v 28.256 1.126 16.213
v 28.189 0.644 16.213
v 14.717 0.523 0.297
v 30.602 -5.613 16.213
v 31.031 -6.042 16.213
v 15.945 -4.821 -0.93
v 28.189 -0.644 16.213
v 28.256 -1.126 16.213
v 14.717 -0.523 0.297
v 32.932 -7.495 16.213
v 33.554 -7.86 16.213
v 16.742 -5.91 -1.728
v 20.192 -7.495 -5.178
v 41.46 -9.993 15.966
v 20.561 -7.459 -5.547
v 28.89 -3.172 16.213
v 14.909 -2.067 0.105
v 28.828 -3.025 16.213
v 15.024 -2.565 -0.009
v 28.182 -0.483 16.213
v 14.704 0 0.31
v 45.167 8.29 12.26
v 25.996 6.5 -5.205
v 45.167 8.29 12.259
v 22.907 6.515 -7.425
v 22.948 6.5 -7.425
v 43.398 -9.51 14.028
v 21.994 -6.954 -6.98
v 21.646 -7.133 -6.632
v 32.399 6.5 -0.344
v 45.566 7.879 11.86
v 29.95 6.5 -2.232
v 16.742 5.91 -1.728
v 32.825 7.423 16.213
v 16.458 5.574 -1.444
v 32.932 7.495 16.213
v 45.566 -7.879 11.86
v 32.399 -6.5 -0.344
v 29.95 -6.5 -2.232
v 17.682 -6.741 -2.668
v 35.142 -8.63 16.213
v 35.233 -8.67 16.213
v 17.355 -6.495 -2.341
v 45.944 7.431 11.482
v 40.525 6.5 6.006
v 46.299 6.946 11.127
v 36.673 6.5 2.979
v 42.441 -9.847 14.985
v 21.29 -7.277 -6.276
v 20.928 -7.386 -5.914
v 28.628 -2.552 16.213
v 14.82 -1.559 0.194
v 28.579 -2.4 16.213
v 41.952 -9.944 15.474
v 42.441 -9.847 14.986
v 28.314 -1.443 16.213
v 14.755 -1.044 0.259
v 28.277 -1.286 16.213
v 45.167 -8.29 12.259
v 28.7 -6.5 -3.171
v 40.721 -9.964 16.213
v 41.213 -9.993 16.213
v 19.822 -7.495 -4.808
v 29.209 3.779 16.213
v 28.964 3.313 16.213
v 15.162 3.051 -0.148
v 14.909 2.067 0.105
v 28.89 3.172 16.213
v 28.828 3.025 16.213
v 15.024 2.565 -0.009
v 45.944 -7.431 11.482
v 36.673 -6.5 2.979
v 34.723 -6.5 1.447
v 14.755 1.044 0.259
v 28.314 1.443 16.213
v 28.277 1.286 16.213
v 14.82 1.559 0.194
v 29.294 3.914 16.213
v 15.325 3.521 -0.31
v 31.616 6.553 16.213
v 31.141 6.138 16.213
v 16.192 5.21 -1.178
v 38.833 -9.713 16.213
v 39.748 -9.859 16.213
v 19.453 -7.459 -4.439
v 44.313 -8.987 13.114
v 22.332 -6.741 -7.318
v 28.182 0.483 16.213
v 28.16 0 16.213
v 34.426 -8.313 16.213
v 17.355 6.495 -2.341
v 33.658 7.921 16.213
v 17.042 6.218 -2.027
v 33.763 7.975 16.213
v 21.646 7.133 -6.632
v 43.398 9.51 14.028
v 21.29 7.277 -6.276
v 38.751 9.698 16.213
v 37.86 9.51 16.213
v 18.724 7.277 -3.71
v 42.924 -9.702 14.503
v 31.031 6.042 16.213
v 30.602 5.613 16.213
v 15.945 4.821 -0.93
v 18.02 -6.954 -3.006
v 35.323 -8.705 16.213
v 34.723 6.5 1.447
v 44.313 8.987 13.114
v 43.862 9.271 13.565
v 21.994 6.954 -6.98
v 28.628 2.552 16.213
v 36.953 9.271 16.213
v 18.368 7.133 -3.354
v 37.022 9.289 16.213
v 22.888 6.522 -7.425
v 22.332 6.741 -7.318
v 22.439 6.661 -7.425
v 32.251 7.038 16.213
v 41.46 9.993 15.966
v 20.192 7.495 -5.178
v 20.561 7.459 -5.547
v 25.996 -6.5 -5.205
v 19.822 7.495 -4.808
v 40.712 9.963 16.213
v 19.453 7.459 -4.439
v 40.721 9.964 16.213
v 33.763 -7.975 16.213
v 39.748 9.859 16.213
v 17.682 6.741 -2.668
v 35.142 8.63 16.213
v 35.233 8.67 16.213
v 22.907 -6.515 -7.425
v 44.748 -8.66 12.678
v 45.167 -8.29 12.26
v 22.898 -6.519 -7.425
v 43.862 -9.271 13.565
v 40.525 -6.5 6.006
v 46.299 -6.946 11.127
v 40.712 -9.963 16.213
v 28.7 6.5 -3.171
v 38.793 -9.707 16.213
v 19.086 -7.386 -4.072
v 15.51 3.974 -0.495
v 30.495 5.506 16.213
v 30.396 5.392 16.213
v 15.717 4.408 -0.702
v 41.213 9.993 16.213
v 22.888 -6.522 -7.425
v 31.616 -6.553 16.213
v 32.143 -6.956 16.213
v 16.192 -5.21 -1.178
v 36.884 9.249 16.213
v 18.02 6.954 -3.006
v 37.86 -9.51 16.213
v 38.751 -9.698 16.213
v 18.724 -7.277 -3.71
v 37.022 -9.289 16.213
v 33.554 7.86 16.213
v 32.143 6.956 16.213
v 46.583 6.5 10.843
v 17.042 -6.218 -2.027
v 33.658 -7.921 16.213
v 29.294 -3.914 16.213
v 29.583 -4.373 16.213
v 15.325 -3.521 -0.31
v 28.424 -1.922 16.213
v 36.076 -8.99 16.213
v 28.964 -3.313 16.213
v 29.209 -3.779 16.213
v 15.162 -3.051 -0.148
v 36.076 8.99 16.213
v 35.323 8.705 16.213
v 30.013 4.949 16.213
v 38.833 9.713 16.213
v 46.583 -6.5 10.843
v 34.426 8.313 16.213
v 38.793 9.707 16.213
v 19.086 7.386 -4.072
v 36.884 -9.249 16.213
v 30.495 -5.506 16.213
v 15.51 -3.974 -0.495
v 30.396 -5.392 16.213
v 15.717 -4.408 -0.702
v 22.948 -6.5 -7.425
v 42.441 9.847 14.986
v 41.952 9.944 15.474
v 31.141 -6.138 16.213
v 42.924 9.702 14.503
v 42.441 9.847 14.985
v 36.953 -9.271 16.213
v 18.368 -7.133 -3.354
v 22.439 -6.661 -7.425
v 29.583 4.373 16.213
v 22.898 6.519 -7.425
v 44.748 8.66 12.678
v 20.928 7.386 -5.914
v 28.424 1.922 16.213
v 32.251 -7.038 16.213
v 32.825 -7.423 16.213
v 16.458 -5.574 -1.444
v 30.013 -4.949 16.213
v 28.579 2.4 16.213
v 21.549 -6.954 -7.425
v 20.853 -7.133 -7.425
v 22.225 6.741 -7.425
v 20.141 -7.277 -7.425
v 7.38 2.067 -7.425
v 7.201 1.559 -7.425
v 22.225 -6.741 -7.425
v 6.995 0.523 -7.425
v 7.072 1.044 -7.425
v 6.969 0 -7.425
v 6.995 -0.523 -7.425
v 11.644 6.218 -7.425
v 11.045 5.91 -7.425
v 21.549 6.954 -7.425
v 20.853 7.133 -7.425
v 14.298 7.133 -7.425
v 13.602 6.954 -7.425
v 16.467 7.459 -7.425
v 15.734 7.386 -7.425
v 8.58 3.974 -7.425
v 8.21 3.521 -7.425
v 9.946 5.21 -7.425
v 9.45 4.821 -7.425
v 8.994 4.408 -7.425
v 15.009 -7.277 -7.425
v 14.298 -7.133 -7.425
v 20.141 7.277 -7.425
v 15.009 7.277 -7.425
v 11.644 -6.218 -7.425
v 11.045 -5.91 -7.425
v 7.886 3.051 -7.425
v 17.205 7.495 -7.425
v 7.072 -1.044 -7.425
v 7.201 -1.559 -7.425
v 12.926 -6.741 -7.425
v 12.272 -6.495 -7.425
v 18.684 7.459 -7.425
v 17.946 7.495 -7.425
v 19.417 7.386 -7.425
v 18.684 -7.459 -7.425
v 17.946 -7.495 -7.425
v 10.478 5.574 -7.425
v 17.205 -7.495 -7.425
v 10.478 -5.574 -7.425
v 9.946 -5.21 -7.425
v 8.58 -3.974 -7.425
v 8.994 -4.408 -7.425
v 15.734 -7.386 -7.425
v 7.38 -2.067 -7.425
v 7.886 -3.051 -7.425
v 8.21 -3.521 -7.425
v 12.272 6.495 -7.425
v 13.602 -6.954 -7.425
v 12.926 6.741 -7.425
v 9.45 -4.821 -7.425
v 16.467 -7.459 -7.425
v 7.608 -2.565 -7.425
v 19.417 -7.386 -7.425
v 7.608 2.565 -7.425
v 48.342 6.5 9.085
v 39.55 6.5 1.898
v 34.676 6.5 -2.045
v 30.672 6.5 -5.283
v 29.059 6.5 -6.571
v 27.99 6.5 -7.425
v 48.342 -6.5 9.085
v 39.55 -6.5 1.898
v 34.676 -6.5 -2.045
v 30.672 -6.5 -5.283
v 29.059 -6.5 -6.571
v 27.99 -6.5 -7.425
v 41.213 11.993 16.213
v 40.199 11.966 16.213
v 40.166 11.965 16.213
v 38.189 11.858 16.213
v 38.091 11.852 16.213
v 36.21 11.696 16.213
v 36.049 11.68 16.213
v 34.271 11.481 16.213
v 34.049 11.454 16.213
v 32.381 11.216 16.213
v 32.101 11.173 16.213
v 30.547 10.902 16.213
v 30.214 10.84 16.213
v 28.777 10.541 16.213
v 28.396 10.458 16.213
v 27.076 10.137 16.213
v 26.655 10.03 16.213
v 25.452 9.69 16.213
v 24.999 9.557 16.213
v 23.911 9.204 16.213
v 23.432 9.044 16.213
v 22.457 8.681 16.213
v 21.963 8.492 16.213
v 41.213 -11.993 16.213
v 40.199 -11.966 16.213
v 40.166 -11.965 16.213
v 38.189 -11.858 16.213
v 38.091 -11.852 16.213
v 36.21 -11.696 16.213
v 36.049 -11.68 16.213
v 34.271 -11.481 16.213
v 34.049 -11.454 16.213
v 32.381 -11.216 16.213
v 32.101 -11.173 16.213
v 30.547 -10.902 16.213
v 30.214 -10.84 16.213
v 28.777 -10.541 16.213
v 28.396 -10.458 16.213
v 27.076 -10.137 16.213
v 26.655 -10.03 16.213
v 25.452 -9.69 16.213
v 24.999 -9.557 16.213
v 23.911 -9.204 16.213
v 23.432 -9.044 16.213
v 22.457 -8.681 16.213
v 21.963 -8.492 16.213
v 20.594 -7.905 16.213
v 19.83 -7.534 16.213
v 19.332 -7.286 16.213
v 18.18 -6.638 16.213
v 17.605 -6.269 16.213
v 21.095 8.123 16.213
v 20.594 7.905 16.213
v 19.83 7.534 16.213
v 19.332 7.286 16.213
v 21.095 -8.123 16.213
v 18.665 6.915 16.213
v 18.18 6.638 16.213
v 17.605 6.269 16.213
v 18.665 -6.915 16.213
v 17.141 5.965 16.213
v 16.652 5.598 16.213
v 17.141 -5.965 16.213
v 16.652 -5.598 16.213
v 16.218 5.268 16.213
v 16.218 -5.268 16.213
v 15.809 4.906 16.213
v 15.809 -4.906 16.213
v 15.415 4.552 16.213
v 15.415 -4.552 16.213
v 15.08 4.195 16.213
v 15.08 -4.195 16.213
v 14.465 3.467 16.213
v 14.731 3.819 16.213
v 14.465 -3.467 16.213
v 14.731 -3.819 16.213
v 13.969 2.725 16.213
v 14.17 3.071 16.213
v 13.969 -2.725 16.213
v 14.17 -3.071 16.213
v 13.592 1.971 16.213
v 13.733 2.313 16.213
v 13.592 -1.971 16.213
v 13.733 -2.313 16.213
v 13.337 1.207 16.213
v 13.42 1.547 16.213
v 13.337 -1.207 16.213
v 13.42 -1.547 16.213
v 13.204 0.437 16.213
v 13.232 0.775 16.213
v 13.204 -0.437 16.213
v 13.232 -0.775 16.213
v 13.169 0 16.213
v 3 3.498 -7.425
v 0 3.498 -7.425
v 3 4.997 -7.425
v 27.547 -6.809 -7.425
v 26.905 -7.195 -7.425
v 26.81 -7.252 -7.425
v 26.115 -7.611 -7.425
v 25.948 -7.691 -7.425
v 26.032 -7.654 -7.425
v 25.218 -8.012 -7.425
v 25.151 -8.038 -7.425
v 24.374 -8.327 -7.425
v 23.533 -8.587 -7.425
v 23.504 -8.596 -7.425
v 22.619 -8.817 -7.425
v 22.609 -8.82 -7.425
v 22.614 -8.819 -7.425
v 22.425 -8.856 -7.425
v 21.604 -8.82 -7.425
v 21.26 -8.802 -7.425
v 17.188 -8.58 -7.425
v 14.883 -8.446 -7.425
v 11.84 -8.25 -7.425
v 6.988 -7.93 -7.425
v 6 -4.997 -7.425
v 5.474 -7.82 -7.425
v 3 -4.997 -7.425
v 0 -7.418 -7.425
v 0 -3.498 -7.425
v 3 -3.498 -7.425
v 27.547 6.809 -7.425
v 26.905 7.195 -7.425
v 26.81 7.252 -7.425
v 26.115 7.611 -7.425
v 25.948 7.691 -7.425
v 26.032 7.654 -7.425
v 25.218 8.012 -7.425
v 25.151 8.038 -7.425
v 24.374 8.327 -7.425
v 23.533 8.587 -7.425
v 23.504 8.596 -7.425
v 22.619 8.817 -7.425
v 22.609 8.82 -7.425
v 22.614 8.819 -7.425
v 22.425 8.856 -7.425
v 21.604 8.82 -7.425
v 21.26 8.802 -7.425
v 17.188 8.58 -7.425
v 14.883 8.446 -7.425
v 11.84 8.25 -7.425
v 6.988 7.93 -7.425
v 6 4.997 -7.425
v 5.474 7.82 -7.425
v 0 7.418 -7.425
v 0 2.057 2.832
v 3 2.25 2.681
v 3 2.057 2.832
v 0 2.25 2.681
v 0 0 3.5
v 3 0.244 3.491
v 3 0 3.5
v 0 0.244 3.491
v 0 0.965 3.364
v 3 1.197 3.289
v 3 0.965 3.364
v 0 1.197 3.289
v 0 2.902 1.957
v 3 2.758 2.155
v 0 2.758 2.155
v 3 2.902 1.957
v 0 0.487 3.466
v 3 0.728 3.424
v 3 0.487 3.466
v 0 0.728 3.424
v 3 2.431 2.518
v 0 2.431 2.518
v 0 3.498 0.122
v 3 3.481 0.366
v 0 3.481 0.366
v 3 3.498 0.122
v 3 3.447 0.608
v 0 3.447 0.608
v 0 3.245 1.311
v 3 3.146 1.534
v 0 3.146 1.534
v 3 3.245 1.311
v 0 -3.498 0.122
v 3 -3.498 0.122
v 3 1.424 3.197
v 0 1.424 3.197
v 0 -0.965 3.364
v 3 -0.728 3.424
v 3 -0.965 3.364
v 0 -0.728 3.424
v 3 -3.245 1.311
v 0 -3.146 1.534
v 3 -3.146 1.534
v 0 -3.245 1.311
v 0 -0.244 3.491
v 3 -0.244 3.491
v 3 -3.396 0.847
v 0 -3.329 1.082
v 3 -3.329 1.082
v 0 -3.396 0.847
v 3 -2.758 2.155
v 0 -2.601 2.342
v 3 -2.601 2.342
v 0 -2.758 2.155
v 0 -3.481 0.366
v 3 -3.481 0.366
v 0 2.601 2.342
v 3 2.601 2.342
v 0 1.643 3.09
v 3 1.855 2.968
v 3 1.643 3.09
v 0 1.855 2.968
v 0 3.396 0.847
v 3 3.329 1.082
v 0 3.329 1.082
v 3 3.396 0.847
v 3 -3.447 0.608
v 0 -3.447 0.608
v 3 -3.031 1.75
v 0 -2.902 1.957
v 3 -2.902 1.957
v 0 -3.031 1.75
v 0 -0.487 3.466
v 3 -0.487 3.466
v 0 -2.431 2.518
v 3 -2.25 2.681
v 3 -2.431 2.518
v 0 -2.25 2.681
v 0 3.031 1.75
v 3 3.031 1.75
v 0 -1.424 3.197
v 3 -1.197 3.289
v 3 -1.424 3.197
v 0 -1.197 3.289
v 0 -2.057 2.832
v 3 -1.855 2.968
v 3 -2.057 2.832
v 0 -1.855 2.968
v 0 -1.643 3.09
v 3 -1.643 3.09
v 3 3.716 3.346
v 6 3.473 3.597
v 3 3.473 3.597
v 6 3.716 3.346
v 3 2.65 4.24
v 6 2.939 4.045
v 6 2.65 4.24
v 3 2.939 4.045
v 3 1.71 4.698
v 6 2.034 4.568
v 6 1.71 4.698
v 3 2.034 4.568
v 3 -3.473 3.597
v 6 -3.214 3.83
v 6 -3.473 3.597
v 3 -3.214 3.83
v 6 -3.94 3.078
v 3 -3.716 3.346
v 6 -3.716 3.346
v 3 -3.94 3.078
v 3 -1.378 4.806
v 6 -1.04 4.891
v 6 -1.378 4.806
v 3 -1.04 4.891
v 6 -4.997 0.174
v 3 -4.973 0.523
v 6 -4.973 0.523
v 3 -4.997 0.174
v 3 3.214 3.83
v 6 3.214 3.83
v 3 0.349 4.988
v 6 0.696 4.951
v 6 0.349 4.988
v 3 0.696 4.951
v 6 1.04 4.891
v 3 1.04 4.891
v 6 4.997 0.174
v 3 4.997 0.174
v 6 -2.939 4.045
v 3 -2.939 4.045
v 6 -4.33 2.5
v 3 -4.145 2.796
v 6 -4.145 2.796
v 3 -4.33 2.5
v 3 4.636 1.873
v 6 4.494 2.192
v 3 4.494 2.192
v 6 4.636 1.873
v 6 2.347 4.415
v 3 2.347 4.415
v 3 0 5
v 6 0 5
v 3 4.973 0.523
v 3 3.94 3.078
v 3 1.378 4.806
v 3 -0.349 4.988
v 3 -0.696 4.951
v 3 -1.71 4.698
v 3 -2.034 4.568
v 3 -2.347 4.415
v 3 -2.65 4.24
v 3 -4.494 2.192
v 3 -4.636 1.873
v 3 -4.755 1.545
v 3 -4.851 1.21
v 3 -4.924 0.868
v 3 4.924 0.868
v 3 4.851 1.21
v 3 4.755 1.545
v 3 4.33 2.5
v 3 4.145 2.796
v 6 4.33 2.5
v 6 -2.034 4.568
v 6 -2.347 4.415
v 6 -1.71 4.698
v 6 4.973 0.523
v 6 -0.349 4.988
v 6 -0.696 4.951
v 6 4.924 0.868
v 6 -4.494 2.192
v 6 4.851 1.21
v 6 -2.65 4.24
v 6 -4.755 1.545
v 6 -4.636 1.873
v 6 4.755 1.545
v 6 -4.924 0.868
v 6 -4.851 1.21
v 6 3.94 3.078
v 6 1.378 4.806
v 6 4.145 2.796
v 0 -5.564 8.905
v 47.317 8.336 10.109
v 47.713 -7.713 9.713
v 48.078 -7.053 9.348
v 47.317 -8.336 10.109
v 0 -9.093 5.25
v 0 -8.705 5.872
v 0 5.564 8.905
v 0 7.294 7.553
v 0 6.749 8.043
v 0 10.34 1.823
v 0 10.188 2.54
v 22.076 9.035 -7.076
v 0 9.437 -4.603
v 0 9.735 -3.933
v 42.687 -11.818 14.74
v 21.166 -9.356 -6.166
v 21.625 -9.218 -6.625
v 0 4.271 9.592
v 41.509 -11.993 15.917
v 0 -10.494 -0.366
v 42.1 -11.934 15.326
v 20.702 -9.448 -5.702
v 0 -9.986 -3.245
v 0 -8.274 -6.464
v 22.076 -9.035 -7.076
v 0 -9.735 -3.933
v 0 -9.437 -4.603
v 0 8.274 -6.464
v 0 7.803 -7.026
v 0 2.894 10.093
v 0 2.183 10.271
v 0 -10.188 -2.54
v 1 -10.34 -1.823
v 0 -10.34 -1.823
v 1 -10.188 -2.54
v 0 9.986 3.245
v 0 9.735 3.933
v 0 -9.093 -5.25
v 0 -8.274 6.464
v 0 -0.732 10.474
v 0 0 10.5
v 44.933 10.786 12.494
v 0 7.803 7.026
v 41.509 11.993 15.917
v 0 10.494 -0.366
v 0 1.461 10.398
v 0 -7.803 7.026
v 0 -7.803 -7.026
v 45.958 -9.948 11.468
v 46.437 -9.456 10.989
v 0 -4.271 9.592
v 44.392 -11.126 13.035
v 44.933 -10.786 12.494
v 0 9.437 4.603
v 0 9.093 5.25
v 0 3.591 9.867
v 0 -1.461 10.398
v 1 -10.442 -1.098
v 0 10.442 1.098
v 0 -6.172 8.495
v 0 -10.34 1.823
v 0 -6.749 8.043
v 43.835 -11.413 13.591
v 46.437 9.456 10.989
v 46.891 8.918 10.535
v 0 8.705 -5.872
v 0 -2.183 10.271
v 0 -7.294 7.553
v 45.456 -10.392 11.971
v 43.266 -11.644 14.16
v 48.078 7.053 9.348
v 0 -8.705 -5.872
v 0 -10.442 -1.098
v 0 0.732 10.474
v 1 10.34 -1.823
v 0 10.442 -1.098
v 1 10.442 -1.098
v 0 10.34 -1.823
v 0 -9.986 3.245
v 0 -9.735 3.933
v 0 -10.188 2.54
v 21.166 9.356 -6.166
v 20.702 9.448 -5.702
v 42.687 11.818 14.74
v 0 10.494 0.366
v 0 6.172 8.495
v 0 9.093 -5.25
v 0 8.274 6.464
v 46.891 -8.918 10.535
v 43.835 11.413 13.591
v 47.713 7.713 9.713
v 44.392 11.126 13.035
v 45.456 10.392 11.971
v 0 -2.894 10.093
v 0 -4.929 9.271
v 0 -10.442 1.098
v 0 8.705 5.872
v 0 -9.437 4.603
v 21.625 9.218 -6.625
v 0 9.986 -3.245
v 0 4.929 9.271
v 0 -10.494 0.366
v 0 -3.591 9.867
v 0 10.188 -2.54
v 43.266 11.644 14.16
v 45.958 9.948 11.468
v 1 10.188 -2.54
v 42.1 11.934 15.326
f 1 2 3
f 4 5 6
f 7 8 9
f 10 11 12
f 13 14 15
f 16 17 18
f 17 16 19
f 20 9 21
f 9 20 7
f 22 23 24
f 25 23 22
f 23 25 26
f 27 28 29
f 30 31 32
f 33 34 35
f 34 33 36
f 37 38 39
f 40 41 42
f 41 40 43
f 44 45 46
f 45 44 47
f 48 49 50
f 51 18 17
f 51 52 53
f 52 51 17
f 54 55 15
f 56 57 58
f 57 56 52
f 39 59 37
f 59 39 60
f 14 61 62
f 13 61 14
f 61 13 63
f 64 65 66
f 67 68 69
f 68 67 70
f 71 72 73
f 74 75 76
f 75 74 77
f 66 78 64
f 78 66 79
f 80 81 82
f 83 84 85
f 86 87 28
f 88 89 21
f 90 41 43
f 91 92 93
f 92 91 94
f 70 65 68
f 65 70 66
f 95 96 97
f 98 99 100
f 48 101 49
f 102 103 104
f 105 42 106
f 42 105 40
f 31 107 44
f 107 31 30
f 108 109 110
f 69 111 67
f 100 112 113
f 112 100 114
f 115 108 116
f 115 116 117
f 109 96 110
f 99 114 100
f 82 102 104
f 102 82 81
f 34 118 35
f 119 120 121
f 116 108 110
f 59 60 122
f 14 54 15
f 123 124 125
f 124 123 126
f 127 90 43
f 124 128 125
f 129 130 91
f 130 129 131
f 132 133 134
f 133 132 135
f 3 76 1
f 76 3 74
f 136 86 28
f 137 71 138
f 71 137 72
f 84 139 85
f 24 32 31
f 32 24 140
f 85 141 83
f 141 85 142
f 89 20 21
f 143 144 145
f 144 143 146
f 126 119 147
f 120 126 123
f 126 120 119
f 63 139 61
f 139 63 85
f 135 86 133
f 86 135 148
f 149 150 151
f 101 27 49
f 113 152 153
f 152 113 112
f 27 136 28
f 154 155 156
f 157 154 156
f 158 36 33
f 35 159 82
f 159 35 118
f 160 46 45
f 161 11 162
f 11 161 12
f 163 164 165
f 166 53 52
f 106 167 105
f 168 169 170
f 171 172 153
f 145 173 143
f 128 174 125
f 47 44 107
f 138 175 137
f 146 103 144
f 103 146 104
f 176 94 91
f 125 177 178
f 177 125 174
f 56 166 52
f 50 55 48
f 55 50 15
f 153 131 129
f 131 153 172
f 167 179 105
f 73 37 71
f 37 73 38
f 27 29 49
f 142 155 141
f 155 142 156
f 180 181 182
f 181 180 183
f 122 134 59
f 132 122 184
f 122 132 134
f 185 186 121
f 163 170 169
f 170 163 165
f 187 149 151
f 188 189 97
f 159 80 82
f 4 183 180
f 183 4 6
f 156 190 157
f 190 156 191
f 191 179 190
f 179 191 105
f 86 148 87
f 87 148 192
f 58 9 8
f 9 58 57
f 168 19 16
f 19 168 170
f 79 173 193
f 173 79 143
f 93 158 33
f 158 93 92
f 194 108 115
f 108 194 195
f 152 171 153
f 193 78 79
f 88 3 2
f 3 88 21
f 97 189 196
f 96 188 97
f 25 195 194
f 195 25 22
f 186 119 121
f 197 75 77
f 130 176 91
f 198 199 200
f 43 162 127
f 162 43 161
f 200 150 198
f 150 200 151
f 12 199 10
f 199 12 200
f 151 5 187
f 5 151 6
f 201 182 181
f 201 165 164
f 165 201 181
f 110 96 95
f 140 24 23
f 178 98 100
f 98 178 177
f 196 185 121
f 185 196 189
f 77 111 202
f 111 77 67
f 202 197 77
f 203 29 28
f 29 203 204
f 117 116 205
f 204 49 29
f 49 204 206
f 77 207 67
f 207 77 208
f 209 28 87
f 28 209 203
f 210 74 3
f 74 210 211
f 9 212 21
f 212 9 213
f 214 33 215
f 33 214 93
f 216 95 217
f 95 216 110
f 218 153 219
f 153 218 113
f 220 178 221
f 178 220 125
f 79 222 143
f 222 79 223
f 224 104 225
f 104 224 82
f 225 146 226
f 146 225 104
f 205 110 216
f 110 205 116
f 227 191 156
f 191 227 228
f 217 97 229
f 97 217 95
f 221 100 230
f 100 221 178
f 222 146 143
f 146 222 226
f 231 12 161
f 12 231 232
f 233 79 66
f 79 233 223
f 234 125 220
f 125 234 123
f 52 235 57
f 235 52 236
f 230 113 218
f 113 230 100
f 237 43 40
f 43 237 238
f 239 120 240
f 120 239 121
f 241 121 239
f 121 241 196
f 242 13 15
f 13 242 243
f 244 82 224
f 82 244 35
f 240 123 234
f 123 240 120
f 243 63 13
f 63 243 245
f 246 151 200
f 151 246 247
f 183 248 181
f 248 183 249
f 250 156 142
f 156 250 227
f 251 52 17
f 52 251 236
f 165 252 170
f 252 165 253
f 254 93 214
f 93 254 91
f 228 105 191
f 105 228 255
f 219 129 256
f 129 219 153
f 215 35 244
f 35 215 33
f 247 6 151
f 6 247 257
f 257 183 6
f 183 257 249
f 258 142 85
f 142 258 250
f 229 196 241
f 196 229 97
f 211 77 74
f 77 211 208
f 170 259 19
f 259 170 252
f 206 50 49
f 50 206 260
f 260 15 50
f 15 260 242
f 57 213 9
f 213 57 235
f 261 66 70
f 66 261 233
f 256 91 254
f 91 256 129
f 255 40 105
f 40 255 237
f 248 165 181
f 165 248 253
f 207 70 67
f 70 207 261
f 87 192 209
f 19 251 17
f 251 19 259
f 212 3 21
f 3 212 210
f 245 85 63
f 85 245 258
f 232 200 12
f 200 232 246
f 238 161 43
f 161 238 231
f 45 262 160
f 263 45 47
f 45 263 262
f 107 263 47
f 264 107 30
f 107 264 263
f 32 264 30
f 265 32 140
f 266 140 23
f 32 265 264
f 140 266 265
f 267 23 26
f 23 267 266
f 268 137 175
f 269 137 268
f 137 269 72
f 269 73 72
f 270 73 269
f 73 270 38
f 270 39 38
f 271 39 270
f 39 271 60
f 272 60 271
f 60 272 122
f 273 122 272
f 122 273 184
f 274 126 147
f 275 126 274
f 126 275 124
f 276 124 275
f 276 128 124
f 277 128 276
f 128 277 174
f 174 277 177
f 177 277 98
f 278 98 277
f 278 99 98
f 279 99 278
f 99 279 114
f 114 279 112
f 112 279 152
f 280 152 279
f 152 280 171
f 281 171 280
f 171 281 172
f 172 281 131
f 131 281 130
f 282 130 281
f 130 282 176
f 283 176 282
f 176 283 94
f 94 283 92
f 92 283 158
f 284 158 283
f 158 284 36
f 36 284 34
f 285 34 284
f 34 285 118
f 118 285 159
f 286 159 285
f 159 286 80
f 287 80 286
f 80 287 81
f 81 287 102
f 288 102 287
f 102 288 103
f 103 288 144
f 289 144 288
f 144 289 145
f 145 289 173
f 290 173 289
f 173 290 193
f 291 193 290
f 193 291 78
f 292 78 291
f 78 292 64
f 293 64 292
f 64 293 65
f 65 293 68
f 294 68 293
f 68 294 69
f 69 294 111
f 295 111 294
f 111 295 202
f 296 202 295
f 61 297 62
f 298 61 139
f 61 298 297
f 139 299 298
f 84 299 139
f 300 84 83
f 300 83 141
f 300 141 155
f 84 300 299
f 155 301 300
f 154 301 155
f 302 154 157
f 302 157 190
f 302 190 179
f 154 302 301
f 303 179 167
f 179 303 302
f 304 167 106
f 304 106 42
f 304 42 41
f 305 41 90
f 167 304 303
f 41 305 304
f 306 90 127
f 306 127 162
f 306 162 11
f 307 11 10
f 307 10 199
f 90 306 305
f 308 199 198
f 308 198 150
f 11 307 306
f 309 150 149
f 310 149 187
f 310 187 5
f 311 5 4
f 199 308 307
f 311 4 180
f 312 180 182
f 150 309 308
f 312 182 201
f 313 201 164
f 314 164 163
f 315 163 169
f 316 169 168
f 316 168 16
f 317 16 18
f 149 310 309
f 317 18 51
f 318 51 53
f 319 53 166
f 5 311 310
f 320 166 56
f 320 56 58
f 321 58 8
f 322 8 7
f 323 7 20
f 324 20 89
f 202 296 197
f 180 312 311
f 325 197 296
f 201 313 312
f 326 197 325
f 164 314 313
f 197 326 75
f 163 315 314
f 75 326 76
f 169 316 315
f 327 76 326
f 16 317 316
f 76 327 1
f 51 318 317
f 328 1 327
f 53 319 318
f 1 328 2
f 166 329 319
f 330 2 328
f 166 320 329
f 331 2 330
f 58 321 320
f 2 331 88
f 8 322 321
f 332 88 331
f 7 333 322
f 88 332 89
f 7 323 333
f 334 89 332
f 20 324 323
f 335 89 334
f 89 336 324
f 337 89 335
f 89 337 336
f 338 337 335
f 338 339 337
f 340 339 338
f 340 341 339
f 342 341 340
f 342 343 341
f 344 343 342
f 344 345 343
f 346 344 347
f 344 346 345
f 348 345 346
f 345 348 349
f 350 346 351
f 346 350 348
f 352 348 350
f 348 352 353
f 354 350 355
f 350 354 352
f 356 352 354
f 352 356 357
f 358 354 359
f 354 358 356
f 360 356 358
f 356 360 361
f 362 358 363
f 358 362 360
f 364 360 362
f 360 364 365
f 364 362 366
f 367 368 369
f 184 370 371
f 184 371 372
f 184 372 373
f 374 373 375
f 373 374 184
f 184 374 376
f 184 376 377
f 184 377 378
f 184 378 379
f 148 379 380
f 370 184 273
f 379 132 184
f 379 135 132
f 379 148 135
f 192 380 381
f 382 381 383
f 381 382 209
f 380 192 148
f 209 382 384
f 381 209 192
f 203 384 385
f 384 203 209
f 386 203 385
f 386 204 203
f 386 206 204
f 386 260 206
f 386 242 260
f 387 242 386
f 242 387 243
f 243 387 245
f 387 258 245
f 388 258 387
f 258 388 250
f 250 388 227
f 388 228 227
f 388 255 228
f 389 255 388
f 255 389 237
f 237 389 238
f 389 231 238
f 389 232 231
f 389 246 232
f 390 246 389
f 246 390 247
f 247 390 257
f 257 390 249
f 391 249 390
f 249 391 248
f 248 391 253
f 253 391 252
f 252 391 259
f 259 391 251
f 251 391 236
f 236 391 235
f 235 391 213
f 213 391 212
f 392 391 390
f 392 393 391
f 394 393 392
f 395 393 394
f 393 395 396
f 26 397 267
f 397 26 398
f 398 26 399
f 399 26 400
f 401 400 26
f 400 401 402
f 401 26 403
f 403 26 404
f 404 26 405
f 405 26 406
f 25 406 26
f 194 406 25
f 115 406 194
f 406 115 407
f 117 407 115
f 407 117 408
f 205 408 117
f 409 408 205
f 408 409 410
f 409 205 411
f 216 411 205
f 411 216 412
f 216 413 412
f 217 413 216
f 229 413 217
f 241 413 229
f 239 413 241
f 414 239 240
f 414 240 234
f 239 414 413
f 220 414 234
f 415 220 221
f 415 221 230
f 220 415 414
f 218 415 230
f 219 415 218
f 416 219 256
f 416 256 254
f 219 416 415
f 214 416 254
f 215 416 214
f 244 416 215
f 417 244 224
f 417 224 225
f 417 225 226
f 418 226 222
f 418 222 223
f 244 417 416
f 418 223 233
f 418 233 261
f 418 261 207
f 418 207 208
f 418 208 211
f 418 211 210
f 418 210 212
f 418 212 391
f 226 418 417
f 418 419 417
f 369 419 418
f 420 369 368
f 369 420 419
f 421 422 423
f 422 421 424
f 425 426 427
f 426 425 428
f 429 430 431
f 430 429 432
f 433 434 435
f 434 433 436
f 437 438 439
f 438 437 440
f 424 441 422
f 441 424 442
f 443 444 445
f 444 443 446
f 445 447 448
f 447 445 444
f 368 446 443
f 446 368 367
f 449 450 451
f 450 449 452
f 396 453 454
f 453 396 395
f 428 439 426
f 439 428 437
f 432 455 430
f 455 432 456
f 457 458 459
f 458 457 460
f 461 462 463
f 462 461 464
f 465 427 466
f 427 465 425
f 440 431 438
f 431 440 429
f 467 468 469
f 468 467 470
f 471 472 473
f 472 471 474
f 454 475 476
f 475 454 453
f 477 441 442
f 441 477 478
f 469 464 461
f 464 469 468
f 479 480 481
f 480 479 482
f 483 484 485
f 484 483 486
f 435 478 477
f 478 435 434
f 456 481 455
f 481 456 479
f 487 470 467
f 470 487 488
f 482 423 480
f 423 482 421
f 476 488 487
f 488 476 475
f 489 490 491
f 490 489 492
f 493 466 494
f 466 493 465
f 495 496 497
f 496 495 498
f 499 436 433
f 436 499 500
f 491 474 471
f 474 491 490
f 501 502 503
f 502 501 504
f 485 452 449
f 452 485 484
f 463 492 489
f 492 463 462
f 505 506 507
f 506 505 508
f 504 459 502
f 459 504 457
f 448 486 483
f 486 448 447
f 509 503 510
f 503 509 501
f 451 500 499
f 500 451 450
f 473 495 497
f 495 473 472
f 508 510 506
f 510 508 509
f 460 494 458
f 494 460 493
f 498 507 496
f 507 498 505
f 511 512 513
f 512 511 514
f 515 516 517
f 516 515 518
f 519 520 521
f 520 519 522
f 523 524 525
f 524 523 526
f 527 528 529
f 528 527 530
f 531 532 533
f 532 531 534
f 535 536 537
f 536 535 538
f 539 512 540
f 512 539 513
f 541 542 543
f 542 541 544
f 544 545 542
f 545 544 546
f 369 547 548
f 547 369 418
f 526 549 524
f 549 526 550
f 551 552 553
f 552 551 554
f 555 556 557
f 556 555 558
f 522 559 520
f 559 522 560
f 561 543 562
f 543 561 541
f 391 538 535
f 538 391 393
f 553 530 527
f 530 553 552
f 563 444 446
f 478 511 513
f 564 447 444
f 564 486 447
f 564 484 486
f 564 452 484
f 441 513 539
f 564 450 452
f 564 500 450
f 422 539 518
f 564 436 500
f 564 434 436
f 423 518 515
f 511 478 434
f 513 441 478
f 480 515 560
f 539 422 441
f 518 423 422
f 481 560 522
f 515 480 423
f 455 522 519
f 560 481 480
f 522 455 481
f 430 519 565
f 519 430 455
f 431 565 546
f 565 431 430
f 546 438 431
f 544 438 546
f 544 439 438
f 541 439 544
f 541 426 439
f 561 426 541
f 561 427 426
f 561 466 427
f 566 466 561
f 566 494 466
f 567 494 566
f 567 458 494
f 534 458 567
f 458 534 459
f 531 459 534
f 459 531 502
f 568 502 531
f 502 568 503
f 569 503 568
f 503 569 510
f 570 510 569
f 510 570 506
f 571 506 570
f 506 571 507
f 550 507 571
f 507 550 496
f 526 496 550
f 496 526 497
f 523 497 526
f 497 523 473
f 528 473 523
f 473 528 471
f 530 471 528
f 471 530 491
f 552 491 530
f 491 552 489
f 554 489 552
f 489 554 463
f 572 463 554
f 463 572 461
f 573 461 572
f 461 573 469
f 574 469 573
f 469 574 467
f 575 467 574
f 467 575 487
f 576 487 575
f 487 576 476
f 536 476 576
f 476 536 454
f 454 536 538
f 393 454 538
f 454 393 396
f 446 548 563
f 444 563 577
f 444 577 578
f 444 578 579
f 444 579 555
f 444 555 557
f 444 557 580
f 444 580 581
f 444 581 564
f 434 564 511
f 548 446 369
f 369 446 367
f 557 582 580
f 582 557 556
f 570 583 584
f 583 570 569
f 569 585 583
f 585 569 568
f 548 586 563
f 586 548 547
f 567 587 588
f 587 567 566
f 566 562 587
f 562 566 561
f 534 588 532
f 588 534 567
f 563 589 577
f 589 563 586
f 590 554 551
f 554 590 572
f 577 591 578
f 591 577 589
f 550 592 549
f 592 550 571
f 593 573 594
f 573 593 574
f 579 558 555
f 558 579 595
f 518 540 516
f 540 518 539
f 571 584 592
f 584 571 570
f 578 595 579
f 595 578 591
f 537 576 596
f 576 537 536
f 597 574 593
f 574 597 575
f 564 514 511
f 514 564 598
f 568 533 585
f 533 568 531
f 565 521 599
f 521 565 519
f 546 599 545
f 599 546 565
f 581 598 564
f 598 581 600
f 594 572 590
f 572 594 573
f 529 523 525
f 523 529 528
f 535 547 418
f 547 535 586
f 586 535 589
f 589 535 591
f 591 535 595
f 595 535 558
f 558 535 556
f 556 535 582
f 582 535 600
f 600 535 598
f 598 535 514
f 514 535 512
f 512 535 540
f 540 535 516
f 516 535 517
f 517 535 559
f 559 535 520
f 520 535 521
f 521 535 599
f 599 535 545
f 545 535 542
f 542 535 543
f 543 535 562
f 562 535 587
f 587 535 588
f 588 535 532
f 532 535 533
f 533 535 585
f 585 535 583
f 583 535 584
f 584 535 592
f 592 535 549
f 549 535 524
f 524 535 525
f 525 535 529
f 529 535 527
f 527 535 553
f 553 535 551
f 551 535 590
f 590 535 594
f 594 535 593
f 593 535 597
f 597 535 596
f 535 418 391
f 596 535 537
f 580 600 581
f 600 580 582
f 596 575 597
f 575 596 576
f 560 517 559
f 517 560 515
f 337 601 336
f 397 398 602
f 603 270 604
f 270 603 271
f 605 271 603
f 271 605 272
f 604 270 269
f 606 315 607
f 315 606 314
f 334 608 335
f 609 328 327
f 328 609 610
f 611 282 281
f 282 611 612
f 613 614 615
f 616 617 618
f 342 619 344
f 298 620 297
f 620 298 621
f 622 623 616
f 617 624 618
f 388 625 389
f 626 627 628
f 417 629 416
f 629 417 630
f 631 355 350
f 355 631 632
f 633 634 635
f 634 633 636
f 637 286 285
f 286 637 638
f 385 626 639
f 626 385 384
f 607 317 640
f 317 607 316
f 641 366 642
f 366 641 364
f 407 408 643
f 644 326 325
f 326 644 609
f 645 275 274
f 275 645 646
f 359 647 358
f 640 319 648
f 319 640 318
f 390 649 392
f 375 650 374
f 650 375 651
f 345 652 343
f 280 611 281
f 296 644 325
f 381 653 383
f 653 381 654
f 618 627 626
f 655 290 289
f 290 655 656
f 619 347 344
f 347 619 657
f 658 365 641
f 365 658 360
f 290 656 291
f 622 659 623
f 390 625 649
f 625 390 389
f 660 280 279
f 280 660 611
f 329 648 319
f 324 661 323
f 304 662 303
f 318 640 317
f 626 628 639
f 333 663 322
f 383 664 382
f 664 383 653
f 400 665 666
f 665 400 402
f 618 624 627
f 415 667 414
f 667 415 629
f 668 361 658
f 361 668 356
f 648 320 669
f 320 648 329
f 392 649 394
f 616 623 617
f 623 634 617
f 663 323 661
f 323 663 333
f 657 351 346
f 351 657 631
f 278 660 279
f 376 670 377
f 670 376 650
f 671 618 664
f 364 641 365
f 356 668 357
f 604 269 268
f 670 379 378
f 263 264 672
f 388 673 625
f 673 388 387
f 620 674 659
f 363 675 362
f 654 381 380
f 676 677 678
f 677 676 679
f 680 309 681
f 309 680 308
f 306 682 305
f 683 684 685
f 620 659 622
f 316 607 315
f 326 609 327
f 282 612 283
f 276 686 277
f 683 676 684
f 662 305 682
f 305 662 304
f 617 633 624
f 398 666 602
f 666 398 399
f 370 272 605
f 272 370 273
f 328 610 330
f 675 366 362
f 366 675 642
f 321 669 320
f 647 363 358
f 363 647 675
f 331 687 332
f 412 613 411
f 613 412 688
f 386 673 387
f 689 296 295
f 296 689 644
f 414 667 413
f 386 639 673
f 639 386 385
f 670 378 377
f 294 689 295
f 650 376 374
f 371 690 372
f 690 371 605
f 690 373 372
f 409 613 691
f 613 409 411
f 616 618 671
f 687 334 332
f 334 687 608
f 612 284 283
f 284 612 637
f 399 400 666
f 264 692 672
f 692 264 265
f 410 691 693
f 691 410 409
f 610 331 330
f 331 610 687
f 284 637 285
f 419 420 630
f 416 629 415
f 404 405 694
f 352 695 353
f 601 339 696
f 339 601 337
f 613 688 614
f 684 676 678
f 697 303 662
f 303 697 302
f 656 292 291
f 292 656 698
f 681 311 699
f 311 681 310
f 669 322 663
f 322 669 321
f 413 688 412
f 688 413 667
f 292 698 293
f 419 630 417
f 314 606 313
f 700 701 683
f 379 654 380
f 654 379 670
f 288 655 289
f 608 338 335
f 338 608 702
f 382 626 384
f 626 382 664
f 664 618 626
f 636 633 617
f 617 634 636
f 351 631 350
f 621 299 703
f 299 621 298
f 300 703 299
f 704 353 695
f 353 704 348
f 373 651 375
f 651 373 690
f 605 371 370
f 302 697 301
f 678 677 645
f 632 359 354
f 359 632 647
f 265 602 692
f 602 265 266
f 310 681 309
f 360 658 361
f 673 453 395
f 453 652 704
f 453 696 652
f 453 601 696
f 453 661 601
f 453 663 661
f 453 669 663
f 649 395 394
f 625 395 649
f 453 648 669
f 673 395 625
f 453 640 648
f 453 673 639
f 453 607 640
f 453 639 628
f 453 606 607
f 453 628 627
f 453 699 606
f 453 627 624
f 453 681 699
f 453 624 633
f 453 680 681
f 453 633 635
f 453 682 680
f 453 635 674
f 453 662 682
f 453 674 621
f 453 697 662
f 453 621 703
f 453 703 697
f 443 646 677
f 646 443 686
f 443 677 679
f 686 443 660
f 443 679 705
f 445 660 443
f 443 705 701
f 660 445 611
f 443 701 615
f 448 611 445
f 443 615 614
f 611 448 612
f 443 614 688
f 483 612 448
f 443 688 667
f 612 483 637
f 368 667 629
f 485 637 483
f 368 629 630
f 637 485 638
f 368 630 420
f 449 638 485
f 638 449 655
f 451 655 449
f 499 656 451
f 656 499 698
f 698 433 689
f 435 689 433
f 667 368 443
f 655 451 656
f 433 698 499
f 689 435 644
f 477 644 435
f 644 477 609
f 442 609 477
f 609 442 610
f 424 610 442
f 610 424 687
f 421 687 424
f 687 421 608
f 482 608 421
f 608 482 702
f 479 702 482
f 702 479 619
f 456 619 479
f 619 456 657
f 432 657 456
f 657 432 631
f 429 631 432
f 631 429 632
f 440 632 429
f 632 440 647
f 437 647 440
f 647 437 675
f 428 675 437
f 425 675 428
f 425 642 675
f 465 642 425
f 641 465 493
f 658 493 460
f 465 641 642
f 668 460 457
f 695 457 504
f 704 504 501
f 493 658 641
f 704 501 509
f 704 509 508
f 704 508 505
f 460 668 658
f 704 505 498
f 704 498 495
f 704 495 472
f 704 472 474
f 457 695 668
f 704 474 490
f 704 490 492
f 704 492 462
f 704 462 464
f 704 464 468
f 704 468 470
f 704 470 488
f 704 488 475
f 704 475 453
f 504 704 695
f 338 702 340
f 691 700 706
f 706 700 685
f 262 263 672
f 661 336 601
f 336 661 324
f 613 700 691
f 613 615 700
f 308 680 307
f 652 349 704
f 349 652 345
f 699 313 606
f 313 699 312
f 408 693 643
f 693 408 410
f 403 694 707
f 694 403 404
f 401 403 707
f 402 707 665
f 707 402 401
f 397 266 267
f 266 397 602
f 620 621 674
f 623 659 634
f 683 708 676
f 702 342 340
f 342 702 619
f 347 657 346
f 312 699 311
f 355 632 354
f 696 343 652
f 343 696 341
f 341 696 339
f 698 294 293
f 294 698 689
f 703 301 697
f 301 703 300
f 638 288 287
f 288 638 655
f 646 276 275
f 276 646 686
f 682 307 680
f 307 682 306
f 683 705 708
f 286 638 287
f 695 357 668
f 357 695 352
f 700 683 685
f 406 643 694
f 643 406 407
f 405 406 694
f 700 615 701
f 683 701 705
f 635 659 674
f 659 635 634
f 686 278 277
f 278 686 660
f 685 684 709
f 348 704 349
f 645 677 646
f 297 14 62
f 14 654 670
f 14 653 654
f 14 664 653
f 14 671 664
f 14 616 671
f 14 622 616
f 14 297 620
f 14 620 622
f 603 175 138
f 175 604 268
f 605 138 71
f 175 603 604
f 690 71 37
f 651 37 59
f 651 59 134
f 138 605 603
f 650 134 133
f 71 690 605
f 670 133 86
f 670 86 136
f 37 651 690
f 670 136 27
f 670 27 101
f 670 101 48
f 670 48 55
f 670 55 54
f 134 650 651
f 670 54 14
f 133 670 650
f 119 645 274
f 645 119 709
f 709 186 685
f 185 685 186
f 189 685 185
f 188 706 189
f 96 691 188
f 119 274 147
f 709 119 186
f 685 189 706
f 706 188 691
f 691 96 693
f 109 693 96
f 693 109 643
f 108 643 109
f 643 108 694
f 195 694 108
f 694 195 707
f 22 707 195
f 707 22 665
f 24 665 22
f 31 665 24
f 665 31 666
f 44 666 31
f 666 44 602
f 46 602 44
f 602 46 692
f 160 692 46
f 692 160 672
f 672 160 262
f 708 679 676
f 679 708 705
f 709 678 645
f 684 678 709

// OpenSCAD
$fn = 90;

EPS=0.01;
M = 100;

MATING_D = 21;

HEAD_D = 20;
HEAD_d = 15;
HOSE_D = 13;
HEAD_H = 30;
CLAW_THICKNESS = 4;
CLAW_Z_OFFSET = -5;
CLAW_ANGLE = 45;

module base() {
    rotate([0, -90,0]) {
        %cylinder(d=MATING_D, h=4);
        translate([0, 0, 4])
            %cylinder(d=62, h=11);
    }
}

module head() {
    %CLAW_TRANSFORM() {
        translate([0,0,EPS])
            cylinder(d1=HEAD_d, d2=HEAD_D, h=HEAD_H);
        translate([0,0,HEAD_H])
            cylinder(d=HEAD_D, h=150);
    }
}

module CLAW_TRANSFORM() {
    translate([20, 0, CLAW_Z_OFFSET])
        rotate([0, CLAW_ANGLE, 0])
            children();
}

module cut() {
    CLAW_TRANSFORM() {
        translate([0,0,EPS])
            cylinder(d1=HEAD_d, d2=HEAD_D, h=HEAD_H);
        cylinder(d=HEAD_d, h=3*HEAD_H, center=true);
        translate([HEAD_D/2, 0,0]) 
            cube([HOSE_D ,HOSE_D,3*HEAD_H], center=true);
    }
    
    translate([0,0,M/2 + cos(CLAW_ANGLE)*HEAD_H + CLAW_Z_OFFSET]) 
        cube(M, center=true);
    translate([0,0,-M/2 - cos(45)*MATING_D/2]) 
        cube(M, center=true);
}

module joint_cut() {
    rotate([0, 90, 0]) {
        hull() for(i=[0:1]) {
            translate([i*10,0,-EPS]) 
                cylinder(d=7, h=6);
        }
        hull() for(i=[0:1]) {
            translate([i*10,0,3]) 
                cylinder(d=10, h=3);
        }
    }
}

module hook() {
    difference() {
        hull(){
            rotate([0, 90,0])
                cylinder(d=MATING_D);
                
            CLAW_TRANSFORM()
                cylinder(d1=HEAD_d+CLAW_THICKNESS, d2=HEAD_D+CLAW_THICKNESS, h=HEAD_H);
        }
        cut();
        joint_cut();
    }
}

base();
hook();
head();
